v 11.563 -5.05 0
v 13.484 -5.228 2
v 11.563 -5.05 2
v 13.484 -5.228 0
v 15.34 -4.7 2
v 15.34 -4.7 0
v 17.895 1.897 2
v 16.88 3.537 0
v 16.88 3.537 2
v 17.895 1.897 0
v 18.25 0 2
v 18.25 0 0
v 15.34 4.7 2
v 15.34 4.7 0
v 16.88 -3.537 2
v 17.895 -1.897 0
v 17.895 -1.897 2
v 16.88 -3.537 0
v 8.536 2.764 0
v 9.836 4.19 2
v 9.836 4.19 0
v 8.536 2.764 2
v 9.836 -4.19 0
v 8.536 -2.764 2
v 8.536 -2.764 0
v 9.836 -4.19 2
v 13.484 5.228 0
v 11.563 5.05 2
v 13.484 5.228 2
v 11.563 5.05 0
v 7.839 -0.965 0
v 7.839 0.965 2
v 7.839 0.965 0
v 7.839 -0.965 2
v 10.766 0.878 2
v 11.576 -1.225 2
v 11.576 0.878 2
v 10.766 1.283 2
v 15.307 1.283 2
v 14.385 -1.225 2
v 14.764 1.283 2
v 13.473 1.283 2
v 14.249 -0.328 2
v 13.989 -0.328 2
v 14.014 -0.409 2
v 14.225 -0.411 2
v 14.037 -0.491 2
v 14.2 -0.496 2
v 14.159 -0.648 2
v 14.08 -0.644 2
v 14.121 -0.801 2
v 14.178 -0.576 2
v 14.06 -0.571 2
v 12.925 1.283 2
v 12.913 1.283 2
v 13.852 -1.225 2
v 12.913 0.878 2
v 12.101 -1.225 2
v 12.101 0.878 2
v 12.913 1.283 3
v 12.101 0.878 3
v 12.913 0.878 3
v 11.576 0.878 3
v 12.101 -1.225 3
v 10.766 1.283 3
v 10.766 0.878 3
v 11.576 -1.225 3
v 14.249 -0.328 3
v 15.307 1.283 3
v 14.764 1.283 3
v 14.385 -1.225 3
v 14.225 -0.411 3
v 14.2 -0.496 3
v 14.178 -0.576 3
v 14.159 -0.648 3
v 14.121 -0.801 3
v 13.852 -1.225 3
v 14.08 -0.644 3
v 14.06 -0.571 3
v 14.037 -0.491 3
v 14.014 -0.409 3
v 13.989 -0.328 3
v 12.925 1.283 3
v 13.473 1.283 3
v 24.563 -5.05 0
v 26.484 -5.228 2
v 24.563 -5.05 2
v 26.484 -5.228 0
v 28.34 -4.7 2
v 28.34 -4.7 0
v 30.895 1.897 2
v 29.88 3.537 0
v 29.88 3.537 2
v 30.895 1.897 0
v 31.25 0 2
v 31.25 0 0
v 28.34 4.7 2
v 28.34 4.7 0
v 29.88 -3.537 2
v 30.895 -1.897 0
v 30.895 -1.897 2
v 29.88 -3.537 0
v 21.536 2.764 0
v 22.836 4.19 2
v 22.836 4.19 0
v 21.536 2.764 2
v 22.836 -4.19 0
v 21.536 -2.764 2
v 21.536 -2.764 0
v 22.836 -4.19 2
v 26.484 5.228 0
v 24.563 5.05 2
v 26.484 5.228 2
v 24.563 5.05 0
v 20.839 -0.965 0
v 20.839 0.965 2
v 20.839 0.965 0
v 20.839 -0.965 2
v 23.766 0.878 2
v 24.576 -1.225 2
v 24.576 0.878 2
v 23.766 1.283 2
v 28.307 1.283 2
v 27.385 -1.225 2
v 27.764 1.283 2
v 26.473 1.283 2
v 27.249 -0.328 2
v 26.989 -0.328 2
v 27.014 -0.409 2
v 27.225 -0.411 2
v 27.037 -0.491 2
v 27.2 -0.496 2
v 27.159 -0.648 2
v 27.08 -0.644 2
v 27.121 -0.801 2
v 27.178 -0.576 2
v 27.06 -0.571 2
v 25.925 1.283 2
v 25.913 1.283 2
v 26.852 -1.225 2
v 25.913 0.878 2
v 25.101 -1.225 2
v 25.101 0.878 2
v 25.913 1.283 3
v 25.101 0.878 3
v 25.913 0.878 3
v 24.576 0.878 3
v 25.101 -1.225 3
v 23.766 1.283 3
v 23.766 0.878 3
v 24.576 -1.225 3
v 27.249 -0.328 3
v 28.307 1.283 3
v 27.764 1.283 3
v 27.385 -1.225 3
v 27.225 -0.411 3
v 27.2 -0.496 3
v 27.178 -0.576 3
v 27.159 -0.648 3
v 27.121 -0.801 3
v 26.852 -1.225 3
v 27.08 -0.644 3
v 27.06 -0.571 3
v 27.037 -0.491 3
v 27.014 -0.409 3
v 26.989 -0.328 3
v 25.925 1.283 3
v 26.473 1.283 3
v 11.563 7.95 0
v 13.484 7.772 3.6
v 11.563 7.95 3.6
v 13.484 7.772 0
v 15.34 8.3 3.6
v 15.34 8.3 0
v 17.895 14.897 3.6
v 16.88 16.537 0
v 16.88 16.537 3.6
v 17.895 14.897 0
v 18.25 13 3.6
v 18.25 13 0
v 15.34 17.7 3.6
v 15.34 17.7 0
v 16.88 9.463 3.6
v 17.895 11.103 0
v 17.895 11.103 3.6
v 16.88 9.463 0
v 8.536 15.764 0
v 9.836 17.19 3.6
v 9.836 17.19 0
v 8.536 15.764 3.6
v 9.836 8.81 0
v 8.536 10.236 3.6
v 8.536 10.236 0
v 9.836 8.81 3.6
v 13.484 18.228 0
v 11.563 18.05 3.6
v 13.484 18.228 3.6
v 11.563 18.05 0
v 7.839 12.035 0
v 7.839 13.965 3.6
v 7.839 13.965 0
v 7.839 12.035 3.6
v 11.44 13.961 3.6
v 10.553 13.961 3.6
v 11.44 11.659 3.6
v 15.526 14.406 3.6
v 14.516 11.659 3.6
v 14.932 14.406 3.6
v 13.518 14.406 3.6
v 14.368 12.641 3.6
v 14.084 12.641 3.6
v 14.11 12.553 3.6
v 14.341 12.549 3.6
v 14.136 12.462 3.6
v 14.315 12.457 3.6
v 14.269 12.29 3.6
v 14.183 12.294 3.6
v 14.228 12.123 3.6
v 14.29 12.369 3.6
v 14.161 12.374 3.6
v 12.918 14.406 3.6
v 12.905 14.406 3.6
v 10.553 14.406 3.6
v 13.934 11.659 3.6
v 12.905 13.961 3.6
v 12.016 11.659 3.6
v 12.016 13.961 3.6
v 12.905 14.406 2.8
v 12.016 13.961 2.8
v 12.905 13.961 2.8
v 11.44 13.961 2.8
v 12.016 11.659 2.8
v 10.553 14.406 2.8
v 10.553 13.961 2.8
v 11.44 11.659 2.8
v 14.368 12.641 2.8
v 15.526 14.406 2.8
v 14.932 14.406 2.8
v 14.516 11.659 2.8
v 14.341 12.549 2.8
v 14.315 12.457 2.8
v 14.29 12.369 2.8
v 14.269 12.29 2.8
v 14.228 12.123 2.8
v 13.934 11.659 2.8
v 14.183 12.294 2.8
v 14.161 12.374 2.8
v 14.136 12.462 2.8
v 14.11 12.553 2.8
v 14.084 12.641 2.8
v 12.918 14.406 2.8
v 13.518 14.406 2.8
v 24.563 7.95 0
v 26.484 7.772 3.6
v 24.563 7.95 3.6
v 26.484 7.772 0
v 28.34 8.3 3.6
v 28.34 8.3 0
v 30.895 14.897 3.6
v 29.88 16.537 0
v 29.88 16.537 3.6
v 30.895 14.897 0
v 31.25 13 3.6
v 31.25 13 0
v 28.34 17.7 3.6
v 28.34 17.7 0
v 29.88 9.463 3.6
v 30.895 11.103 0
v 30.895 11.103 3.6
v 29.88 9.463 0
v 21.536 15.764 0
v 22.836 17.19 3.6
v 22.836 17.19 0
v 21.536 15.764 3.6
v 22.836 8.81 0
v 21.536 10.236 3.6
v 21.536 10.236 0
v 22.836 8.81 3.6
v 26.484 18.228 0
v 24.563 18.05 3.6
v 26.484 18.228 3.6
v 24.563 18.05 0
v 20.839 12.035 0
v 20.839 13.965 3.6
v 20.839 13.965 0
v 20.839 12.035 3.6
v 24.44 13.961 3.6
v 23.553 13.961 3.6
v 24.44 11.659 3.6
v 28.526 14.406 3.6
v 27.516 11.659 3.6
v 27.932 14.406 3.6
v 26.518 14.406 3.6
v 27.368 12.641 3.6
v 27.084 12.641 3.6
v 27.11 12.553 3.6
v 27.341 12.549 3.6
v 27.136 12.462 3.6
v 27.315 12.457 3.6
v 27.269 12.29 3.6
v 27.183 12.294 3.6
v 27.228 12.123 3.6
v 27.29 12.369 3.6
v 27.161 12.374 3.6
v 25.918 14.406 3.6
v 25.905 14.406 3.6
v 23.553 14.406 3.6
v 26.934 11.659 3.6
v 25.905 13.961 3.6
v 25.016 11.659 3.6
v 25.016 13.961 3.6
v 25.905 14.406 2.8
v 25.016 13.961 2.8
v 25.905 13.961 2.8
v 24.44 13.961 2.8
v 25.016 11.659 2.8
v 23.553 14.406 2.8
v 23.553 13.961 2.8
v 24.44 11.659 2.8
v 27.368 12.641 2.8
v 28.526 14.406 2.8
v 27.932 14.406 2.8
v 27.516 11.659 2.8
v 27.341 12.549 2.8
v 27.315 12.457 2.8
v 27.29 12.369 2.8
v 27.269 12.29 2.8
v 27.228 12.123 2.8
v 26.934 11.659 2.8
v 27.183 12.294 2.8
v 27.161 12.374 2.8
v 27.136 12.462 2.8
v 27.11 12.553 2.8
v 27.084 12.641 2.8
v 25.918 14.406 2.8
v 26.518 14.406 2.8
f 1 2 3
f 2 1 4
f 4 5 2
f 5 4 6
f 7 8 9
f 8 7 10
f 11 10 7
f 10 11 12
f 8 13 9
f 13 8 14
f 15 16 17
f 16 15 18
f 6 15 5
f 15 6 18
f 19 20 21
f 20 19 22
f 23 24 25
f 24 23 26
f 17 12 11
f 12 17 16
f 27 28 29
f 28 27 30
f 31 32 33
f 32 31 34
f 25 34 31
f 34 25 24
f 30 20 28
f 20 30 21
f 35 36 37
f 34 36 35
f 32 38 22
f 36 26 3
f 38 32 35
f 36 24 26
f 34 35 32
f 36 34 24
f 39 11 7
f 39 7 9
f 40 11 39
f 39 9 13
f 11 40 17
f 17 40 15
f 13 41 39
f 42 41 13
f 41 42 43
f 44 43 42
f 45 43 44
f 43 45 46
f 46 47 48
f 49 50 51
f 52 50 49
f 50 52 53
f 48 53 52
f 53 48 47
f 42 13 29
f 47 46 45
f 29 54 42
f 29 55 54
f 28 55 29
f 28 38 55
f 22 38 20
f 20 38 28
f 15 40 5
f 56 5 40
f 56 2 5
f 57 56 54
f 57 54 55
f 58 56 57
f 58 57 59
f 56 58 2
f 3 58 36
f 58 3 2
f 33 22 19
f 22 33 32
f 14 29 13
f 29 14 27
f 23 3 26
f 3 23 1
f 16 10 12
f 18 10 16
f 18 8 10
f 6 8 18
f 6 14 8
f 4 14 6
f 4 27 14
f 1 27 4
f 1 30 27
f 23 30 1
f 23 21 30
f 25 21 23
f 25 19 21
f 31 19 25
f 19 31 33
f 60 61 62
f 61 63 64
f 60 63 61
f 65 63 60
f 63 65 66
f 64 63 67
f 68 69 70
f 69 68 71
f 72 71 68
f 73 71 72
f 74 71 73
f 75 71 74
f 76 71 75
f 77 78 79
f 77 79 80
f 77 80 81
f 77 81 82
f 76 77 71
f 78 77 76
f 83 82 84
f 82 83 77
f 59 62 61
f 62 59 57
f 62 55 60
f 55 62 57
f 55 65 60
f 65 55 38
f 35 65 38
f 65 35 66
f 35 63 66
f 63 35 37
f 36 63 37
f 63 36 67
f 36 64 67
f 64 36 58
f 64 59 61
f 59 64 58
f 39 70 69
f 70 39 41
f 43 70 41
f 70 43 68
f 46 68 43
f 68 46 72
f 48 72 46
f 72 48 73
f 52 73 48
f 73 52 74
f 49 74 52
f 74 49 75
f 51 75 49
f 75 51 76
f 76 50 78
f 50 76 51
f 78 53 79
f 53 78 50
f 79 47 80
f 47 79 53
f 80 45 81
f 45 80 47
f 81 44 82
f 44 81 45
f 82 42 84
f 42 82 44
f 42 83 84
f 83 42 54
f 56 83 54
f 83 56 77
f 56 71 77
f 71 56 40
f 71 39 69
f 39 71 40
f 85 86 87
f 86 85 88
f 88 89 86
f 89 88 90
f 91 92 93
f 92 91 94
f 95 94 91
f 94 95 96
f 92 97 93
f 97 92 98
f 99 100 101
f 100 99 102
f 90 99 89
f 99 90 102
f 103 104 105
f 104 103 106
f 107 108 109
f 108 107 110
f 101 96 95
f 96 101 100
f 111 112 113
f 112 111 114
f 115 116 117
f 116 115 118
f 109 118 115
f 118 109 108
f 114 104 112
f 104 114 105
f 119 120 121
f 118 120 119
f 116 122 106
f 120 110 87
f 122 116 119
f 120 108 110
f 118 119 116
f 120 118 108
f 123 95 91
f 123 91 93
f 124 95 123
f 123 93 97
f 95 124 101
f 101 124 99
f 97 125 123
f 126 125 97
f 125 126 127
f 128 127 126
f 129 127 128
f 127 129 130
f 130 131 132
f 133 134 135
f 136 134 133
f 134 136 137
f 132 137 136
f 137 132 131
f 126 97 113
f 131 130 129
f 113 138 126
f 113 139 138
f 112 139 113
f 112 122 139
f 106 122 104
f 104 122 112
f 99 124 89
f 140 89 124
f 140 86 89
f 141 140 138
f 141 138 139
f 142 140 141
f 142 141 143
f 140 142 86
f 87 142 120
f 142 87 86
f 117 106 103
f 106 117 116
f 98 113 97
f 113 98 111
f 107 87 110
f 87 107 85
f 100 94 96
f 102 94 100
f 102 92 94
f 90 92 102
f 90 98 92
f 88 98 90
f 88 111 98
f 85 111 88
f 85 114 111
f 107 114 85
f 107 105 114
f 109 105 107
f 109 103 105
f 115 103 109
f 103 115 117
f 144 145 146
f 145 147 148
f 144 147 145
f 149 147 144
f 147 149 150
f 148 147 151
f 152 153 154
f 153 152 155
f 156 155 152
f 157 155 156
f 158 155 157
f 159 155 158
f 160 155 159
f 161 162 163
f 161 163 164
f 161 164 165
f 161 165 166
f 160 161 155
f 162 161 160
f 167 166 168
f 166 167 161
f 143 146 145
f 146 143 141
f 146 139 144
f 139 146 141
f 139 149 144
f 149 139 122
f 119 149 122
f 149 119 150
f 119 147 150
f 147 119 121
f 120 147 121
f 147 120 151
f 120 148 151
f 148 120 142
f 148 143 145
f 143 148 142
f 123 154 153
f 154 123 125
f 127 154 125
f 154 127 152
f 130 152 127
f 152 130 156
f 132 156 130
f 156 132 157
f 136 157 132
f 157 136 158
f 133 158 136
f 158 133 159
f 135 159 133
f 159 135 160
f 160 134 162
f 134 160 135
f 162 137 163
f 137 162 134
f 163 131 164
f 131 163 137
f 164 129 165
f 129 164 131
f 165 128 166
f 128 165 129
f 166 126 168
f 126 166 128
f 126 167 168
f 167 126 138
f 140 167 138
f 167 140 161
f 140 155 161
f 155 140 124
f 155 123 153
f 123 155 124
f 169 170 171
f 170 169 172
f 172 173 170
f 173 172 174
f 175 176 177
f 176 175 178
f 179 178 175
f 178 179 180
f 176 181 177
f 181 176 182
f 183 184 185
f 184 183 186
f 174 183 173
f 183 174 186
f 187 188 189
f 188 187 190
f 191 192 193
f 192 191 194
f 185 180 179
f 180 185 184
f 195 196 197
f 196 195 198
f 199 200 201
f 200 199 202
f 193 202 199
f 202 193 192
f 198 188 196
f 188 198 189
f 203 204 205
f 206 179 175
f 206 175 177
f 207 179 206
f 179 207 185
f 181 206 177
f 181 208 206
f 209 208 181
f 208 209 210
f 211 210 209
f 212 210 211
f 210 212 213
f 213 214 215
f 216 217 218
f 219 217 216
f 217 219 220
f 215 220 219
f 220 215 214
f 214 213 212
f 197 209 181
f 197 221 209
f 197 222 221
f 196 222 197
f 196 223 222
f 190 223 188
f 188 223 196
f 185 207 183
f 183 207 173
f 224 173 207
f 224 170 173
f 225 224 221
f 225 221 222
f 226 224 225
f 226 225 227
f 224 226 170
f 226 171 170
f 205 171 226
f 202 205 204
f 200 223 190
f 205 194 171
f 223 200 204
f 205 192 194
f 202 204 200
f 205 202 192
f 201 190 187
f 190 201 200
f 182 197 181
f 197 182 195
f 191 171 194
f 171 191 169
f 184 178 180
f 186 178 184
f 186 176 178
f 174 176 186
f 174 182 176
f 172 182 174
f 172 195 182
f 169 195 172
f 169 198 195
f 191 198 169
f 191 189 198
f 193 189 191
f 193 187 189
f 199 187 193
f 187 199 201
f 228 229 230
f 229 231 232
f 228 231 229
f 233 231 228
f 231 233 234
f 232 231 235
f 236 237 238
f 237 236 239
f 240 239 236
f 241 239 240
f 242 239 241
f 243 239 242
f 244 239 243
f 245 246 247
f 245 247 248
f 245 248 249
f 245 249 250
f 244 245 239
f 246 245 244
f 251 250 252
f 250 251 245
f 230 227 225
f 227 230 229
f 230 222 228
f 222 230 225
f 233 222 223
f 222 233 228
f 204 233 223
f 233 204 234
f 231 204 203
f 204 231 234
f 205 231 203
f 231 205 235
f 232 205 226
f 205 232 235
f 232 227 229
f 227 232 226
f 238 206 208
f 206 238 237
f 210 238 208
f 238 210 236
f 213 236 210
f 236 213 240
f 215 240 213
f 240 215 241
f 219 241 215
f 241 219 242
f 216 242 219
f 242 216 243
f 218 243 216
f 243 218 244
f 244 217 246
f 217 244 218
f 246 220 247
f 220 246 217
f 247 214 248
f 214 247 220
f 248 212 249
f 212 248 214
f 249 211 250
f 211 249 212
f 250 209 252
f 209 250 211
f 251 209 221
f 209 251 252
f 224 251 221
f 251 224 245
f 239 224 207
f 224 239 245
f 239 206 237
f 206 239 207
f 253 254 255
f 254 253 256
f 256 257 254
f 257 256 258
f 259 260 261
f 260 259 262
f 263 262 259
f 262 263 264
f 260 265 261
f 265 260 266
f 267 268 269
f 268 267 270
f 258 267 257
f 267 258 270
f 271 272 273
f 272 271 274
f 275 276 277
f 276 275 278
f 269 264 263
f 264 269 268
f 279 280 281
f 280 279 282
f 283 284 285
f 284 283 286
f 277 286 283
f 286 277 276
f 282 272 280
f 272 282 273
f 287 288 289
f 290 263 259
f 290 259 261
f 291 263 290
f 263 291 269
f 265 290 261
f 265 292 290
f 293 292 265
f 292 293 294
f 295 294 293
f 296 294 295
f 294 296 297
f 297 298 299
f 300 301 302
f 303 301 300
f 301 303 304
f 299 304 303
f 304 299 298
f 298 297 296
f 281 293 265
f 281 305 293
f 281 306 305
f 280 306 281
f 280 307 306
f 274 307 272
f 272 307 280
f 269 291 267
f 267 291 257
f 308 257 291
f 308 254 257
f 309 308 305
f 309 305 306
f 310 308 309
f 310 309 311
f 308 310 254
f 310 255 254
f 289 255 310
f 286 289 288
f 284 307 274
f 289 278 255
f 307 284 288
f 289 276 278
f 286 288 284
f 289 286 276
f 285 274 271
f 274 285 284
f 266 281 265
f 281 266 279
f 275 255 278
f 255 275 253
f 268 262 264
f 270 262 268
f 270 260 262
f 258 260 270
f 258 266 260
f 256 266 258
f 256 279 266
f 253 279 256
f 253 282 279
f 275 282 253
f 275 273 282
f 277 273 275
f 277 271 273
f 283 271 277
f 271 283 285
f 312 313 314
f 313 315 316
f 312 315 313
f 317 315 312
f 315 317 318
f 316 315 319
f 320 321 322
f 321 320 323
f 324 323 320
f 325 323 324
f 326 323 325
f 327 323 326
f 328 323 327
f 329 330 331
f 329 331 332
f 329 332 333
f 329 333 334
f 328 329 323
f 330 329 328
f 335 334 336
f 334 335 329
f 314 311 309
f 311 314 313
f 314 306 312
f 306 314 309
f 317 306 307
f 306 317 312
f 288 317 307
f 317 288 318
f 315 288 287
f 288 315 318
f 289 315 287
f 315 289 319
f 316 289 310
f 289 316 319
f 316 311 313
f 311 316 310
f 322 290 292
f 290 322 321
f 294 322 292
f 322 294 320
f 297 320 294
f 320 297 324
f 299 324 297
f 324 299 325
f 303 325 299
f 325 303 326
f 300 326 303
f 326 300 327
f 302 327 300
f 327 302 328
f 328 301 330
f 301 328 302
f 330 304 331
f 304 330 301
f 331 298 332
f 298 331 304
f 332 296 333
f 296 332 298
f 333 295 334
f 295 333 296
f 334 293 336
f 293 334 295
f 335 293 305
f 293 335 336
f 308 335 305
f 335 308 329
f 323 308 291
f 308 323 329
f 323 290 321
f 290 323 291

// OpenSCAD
include <../../Scripts/18xx tiles basic functions.scad>
make_token_array("TV",2,2,0,"th");
